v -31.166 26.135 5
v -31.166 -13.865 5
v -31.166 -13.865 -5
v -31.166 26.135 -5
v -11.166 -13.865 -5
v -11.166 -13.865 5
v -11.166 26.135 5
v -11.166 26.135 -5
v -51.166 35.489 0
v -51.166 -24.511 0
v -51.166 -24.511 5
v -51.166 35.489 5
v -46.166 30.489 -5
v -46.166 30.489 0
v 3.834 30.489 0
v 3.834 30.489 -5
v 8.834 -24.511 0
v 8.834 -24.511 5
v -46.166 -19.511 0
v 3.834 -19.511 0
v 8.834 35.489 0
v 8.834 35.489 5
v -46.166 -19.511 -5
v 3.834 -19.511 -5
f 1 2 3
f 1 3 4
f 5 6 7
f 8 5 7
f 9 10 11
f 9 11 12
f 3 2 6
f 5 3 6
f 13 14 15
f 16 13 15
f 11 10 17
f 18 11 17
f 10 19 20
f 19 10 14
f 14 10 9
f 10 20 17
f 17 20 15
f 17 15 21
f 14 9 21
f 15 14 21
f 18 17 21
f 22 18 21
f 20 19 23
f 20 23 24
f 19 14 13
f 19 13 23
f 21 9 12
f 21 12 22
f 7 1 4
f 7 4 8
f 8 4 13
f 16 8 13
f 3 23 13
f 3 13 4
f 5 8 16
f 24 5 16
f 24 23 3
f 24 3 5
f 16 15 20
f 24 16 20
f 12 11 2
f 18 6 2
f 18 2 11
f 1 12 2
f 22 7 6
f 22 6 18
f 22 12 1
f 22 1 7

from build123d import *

# Parameters (mm, degrees)
F0_W     = 60
F0_H     = 60
F1_DEPTH = 5
F2_W     = 50
F2_H     = 50
F3_DEPTH = 5
F4_W     = 20
F4_H     = 40
F5_DEPTH = 10


with BuildPart() as f1:
    # F0 (on Top) → F1 (new body)
    with BuildSketch(Plane.XY):
        with Locations((-21.16647, 5.48928)):
            Rectangle(F0_W, F0_H)
    extrude(amount=F1_DEPTH)

    # F2 (on face) → F3 (join)
    with BuildSketch(Plane(origin=(0, 0, 0), x_dir=(1, 0, 0), z_dir=(0, 0, -1))):
        with Locations((-21.16647, -5.48928)):
            Rectangle(F2_W, F2_H)
    extrude(amount=F3_DEPTH)

    # F4 (on face) → F5 (cut)
    with BuildSketch(Plane.XY.offset(5)):
        with Locations((-21.16647, 6.135008)):
            Rectangle(F4_W, F4_H)
    extrude(amount=-F5_DEPTH, mode=Mode.SUBTRACT)


solid = f1.part
